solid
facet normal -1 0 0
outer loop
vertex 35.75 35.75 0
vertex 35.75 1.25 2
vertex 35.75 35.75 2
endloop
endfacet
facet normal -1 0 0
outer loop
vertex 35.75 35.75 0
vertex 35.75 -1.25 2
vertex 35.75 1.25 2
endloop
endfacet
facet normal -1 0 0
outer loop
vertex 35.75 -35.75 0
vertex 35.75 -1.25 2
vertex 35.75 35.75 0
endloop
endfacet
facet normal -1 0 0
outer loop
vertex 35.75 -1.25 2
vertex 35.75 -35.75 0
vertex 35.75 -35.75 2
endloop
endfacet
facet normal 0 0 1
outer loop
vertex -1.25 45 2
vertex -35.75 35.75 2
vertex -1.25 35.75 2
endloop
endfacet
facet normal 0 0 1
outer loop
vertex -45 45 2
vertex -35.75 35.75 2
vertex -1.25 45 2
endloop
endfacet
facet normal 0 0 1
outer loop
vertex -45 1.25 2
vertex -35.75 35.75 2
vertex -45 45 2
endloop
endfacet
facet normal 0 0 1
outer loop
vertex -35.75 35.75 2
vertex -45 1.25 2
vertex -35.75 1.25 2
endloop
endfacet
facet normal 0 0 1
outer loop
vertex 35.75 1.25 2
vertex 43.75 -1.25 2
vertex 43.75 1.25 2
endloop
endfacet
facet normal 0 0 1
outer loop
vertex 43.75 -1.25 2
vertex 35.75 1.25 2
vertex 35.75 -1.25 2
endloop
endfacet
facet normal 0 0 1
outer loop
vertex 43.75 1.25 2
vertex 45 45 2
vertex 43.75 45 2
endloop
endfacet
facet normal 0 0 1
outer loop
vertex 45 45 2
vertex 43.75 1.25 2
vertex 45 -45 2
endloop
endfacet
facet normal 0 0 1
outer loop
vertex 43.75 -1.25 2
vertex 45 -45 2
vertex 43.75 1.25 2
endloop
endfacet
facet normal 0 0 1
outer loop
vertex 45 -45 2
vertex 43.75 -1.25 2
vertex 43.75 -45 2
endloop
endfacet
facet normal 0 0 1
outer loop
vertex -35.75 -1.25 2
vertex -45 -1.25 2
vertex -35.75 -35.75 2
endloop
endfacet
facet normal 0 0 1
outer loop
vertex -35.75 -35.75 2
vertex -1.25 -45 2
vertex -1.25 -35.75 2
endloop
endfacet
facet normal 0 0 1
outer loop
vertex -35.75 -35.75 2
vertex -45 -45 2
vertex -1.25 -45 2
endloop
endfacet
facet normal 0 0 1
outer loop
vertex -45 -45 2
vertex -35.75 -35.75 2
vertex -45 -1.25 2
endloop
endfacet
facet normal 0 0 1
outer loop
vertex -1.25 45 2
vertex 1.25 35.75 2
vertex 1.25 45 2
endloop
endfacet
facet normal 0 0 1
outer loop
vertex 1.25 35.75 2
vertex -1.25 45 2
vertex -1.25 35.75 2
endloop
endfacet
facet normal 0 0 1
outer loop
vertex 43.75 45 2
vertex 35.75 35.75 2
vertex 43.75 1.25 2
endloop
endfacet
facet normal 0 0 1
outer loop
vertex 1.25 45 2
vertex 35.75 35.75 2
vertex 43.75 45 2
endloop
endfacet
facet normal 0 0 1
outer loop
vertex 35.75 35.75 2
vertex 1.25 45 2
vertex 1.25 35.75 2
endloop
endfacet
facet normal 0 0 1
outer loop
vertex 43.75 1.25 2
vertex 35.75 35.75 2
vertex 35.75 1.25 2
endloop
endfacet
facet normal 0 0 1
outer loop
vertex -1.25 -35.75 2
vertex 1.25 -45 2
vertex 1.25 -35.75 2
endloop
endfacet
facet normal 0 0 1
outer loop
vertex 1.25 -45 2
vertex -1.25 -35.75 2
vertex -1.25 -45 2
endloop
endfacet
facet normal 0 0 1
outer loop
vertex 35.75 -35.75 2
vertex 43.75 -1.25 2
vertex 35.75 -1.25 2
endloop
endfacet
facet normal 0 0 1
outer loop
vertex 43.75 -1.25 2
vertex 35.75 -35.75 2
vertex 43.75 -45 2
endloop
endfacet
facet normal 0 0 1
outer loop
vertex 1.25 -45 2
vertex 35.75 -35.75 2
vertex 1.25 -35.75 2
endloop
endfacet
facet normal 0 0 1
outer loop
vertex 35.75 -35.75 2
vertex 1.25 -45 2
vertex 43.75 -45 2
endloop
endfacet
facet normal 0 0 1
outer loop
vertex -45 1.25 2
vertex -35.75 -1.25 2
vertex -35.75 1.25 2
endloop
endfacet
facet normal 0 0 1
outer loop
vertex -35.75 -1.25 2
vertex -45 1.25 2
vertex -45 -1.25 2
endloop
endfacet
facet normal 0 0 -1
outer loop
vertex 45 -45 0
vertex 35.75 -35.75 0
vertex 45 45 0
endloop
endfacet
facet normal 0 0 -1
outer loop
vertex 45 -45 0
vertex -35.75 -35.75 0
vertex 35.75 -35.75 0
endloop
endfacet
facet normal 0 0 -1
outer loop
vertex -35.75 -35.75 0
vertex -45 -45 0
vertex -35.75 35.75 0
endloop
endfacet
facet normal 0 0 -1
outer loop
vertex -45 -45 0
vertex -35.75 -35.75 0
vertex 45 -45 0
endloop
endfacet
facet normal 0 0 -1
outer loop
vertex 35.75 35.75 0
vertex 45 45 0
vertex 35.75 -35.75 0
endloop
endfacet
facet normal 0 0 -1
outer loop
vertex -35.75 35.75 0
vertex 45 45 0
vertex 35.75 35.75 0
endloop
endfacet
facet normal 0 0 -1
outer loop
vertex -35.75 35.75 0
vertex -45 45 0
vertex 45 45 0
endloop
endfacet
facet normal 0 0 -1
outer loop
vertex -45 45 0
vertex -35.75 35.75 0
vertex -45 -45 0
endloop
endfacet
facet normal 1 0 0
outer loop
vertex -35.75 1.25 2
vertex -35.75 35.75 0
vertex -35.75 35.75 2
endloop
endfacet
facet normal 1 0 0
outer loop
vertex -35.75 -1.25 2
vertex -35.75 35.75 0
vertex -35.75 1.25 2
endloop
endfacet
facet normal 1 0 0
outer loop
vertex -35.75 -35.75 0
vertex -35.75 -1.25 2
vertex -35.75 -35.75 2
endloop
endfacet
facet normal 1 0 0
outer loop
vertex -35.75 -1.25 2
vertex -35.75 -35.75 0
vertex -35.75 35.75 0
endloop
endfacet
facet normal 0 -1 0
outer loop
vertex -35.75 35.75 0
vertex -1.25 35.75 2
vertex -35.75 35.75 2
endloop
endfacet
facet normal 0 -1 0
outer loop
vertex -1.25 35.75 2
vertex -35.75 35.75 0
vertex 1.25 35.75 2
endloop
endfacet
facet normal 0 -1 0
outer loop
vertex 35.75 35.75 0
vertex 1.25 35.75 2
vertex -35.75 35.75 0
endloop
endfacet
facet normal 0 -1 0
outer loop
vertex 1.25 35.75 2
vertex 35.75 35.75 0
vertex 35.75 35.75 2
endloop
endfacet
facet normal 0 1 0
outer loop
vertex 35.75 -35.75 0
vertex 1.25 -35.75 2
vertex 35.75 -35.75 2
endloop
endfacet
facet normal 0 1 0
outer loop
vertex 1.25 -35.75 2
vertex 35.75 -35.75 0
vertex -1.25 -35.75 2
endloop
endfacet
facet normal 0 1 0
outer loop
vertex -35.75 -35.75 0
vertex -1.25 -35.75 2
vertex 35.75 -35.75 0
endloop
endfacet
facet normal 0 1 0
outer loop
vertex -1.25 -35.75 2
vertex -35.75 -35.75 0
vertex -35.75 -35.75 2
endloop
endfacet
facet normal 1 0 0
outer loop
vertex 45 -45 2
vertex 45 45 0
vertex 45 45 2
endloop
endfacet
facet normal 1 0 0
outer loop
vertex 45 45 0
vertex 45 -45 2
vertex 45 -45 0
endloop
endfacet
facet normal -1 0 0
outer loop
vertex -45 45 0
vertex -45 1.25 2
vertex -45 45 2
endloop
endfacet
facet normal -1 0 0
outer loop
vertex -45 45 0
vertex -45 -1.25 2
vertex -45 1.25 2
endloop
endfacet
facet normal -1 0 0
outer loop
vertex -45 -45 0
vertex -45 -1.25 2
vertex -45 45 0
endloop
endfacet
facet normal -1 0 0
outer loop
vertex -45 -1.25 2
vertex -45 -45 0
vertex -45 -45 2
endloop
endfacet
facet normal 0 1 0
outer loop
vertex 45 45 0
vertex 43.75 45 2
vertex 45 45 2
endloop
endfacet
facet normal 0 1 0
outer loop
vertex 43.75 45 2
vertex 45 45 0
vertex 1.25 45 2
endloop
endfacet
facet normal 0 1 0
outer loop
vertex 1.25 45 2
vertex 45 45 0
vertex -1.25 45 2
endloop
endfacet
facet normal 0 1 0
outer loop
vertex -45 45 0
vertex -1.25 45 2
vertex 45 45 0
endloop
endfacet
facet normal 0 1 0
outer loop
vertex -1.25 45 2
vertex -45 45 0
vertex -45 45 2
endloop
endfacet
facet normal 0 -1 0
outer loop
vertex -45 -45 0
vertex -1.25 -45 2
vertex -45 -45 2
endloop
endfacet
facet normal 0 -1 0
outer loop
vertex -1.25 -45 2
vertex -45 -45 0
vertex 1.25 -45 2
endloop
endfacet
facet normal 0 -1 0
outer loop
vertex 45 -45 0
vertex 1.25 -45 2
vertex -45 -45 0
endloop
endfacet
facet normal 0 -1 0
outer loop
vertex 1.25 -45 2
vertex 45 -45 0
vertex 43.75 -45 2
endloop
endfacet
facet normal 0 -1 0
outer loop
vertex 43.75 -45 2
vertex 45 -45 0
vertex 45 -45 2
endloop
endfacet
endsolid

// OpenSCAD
// Built by bench/smallmodels/features/compiler.py from a list of features.
$fn = 64;
difference() {
  union() {
    translate([0, 0, 0]) translate([-45, -45, 0]) cube([90, 90, 2]);
  }
  union() {
    translate([0, 0, 0]) rotate([0, 0, 0]) translate([-35.75, -35.75, 0]) cube([71.5, 71.5, 2]);
    translate([0, 0, 2]) rotate([0, 0, 0]) translate([-45, -1.25, 0]) cube([90, 2.5, 38]);
    translate([0, 0, 2]) rotate([0, 0, 0]) translate([-45, -1.25, 0]) cube([90, 2.5, 38]);
    translate([0, 0, 2]) rotate([0, 0, 0]) translate([-45, -1.25, 0]) cube([90, 2.5, 38]);
    translate([0, 0, 2]) rotate([0, 0, 0]) translate([-45, -1.25, 0]) cube([90, 2.5, 38]);
    translate([0, 0, 2]) rotate([0, 0, 0]) translate([-1.25, -45, 0]) cube([2.5, 90, 38]);
    translate([0, 0, 2]) rotate([0, 0, 0]) translate([-1.25, -45, 0]) cube([2.5, 90, 38]);
    translate([0, 0, 2]) rotate([0, 0, 0]) translate([-1.25, -45, 0]) cube([2.5, 90, 38]);
    translate([0, 0, 2]) rotate([0, 0, 0]) translate([-1.25, -45, 0]) cube([2.5, 90, 38]);
    translate([0, 77.5, 2]) rotate([0, 0, 0]) translate([-45, -1.25, 0]) cube([90, 2.5, 38]);
    translate([0, 77.5, 2]) rotate([0, 0, 0]) translate([-45, -1.25, 0]) cube([90, 2.5, 38]);
    translate([0, 77.5, 2]) rotate([0, 0, 0]) translate([-45, -1.25, 0]) cube([90, 2.5, 38]);
    translate([0, 77.5, 2]) rotate([0, 0, 0]) translate([-45, -1.25, 0]) cube([90, 2.5, 38]);
    translate([45, 0, 2]) rotate([0, 0, 0]) translate([-1.25, -45, 0]) cube([2.5, 90, 38]);
    translate([45, 0, 2]) rotate([0, 0, 0]) translate([-1.25, -45, 0]) cube([2.5, 90, 38]);
    translate([45, 0, 2]) rotate([0, 0, 0]) translate([-1.25, -45, 0]) cube([2.5, 90, 38]);
    translate([45, 0, 2]) rotate([0, 0, 0]) translate([-1.25, -45, 0]) cube([2.5, 90, 38]);
    translate([-45, -37.5, 32]) rotate([0, 0, 0]) translate([-6, -1.25, 0]) cube([12, 2.5, 8]);
  }
}
